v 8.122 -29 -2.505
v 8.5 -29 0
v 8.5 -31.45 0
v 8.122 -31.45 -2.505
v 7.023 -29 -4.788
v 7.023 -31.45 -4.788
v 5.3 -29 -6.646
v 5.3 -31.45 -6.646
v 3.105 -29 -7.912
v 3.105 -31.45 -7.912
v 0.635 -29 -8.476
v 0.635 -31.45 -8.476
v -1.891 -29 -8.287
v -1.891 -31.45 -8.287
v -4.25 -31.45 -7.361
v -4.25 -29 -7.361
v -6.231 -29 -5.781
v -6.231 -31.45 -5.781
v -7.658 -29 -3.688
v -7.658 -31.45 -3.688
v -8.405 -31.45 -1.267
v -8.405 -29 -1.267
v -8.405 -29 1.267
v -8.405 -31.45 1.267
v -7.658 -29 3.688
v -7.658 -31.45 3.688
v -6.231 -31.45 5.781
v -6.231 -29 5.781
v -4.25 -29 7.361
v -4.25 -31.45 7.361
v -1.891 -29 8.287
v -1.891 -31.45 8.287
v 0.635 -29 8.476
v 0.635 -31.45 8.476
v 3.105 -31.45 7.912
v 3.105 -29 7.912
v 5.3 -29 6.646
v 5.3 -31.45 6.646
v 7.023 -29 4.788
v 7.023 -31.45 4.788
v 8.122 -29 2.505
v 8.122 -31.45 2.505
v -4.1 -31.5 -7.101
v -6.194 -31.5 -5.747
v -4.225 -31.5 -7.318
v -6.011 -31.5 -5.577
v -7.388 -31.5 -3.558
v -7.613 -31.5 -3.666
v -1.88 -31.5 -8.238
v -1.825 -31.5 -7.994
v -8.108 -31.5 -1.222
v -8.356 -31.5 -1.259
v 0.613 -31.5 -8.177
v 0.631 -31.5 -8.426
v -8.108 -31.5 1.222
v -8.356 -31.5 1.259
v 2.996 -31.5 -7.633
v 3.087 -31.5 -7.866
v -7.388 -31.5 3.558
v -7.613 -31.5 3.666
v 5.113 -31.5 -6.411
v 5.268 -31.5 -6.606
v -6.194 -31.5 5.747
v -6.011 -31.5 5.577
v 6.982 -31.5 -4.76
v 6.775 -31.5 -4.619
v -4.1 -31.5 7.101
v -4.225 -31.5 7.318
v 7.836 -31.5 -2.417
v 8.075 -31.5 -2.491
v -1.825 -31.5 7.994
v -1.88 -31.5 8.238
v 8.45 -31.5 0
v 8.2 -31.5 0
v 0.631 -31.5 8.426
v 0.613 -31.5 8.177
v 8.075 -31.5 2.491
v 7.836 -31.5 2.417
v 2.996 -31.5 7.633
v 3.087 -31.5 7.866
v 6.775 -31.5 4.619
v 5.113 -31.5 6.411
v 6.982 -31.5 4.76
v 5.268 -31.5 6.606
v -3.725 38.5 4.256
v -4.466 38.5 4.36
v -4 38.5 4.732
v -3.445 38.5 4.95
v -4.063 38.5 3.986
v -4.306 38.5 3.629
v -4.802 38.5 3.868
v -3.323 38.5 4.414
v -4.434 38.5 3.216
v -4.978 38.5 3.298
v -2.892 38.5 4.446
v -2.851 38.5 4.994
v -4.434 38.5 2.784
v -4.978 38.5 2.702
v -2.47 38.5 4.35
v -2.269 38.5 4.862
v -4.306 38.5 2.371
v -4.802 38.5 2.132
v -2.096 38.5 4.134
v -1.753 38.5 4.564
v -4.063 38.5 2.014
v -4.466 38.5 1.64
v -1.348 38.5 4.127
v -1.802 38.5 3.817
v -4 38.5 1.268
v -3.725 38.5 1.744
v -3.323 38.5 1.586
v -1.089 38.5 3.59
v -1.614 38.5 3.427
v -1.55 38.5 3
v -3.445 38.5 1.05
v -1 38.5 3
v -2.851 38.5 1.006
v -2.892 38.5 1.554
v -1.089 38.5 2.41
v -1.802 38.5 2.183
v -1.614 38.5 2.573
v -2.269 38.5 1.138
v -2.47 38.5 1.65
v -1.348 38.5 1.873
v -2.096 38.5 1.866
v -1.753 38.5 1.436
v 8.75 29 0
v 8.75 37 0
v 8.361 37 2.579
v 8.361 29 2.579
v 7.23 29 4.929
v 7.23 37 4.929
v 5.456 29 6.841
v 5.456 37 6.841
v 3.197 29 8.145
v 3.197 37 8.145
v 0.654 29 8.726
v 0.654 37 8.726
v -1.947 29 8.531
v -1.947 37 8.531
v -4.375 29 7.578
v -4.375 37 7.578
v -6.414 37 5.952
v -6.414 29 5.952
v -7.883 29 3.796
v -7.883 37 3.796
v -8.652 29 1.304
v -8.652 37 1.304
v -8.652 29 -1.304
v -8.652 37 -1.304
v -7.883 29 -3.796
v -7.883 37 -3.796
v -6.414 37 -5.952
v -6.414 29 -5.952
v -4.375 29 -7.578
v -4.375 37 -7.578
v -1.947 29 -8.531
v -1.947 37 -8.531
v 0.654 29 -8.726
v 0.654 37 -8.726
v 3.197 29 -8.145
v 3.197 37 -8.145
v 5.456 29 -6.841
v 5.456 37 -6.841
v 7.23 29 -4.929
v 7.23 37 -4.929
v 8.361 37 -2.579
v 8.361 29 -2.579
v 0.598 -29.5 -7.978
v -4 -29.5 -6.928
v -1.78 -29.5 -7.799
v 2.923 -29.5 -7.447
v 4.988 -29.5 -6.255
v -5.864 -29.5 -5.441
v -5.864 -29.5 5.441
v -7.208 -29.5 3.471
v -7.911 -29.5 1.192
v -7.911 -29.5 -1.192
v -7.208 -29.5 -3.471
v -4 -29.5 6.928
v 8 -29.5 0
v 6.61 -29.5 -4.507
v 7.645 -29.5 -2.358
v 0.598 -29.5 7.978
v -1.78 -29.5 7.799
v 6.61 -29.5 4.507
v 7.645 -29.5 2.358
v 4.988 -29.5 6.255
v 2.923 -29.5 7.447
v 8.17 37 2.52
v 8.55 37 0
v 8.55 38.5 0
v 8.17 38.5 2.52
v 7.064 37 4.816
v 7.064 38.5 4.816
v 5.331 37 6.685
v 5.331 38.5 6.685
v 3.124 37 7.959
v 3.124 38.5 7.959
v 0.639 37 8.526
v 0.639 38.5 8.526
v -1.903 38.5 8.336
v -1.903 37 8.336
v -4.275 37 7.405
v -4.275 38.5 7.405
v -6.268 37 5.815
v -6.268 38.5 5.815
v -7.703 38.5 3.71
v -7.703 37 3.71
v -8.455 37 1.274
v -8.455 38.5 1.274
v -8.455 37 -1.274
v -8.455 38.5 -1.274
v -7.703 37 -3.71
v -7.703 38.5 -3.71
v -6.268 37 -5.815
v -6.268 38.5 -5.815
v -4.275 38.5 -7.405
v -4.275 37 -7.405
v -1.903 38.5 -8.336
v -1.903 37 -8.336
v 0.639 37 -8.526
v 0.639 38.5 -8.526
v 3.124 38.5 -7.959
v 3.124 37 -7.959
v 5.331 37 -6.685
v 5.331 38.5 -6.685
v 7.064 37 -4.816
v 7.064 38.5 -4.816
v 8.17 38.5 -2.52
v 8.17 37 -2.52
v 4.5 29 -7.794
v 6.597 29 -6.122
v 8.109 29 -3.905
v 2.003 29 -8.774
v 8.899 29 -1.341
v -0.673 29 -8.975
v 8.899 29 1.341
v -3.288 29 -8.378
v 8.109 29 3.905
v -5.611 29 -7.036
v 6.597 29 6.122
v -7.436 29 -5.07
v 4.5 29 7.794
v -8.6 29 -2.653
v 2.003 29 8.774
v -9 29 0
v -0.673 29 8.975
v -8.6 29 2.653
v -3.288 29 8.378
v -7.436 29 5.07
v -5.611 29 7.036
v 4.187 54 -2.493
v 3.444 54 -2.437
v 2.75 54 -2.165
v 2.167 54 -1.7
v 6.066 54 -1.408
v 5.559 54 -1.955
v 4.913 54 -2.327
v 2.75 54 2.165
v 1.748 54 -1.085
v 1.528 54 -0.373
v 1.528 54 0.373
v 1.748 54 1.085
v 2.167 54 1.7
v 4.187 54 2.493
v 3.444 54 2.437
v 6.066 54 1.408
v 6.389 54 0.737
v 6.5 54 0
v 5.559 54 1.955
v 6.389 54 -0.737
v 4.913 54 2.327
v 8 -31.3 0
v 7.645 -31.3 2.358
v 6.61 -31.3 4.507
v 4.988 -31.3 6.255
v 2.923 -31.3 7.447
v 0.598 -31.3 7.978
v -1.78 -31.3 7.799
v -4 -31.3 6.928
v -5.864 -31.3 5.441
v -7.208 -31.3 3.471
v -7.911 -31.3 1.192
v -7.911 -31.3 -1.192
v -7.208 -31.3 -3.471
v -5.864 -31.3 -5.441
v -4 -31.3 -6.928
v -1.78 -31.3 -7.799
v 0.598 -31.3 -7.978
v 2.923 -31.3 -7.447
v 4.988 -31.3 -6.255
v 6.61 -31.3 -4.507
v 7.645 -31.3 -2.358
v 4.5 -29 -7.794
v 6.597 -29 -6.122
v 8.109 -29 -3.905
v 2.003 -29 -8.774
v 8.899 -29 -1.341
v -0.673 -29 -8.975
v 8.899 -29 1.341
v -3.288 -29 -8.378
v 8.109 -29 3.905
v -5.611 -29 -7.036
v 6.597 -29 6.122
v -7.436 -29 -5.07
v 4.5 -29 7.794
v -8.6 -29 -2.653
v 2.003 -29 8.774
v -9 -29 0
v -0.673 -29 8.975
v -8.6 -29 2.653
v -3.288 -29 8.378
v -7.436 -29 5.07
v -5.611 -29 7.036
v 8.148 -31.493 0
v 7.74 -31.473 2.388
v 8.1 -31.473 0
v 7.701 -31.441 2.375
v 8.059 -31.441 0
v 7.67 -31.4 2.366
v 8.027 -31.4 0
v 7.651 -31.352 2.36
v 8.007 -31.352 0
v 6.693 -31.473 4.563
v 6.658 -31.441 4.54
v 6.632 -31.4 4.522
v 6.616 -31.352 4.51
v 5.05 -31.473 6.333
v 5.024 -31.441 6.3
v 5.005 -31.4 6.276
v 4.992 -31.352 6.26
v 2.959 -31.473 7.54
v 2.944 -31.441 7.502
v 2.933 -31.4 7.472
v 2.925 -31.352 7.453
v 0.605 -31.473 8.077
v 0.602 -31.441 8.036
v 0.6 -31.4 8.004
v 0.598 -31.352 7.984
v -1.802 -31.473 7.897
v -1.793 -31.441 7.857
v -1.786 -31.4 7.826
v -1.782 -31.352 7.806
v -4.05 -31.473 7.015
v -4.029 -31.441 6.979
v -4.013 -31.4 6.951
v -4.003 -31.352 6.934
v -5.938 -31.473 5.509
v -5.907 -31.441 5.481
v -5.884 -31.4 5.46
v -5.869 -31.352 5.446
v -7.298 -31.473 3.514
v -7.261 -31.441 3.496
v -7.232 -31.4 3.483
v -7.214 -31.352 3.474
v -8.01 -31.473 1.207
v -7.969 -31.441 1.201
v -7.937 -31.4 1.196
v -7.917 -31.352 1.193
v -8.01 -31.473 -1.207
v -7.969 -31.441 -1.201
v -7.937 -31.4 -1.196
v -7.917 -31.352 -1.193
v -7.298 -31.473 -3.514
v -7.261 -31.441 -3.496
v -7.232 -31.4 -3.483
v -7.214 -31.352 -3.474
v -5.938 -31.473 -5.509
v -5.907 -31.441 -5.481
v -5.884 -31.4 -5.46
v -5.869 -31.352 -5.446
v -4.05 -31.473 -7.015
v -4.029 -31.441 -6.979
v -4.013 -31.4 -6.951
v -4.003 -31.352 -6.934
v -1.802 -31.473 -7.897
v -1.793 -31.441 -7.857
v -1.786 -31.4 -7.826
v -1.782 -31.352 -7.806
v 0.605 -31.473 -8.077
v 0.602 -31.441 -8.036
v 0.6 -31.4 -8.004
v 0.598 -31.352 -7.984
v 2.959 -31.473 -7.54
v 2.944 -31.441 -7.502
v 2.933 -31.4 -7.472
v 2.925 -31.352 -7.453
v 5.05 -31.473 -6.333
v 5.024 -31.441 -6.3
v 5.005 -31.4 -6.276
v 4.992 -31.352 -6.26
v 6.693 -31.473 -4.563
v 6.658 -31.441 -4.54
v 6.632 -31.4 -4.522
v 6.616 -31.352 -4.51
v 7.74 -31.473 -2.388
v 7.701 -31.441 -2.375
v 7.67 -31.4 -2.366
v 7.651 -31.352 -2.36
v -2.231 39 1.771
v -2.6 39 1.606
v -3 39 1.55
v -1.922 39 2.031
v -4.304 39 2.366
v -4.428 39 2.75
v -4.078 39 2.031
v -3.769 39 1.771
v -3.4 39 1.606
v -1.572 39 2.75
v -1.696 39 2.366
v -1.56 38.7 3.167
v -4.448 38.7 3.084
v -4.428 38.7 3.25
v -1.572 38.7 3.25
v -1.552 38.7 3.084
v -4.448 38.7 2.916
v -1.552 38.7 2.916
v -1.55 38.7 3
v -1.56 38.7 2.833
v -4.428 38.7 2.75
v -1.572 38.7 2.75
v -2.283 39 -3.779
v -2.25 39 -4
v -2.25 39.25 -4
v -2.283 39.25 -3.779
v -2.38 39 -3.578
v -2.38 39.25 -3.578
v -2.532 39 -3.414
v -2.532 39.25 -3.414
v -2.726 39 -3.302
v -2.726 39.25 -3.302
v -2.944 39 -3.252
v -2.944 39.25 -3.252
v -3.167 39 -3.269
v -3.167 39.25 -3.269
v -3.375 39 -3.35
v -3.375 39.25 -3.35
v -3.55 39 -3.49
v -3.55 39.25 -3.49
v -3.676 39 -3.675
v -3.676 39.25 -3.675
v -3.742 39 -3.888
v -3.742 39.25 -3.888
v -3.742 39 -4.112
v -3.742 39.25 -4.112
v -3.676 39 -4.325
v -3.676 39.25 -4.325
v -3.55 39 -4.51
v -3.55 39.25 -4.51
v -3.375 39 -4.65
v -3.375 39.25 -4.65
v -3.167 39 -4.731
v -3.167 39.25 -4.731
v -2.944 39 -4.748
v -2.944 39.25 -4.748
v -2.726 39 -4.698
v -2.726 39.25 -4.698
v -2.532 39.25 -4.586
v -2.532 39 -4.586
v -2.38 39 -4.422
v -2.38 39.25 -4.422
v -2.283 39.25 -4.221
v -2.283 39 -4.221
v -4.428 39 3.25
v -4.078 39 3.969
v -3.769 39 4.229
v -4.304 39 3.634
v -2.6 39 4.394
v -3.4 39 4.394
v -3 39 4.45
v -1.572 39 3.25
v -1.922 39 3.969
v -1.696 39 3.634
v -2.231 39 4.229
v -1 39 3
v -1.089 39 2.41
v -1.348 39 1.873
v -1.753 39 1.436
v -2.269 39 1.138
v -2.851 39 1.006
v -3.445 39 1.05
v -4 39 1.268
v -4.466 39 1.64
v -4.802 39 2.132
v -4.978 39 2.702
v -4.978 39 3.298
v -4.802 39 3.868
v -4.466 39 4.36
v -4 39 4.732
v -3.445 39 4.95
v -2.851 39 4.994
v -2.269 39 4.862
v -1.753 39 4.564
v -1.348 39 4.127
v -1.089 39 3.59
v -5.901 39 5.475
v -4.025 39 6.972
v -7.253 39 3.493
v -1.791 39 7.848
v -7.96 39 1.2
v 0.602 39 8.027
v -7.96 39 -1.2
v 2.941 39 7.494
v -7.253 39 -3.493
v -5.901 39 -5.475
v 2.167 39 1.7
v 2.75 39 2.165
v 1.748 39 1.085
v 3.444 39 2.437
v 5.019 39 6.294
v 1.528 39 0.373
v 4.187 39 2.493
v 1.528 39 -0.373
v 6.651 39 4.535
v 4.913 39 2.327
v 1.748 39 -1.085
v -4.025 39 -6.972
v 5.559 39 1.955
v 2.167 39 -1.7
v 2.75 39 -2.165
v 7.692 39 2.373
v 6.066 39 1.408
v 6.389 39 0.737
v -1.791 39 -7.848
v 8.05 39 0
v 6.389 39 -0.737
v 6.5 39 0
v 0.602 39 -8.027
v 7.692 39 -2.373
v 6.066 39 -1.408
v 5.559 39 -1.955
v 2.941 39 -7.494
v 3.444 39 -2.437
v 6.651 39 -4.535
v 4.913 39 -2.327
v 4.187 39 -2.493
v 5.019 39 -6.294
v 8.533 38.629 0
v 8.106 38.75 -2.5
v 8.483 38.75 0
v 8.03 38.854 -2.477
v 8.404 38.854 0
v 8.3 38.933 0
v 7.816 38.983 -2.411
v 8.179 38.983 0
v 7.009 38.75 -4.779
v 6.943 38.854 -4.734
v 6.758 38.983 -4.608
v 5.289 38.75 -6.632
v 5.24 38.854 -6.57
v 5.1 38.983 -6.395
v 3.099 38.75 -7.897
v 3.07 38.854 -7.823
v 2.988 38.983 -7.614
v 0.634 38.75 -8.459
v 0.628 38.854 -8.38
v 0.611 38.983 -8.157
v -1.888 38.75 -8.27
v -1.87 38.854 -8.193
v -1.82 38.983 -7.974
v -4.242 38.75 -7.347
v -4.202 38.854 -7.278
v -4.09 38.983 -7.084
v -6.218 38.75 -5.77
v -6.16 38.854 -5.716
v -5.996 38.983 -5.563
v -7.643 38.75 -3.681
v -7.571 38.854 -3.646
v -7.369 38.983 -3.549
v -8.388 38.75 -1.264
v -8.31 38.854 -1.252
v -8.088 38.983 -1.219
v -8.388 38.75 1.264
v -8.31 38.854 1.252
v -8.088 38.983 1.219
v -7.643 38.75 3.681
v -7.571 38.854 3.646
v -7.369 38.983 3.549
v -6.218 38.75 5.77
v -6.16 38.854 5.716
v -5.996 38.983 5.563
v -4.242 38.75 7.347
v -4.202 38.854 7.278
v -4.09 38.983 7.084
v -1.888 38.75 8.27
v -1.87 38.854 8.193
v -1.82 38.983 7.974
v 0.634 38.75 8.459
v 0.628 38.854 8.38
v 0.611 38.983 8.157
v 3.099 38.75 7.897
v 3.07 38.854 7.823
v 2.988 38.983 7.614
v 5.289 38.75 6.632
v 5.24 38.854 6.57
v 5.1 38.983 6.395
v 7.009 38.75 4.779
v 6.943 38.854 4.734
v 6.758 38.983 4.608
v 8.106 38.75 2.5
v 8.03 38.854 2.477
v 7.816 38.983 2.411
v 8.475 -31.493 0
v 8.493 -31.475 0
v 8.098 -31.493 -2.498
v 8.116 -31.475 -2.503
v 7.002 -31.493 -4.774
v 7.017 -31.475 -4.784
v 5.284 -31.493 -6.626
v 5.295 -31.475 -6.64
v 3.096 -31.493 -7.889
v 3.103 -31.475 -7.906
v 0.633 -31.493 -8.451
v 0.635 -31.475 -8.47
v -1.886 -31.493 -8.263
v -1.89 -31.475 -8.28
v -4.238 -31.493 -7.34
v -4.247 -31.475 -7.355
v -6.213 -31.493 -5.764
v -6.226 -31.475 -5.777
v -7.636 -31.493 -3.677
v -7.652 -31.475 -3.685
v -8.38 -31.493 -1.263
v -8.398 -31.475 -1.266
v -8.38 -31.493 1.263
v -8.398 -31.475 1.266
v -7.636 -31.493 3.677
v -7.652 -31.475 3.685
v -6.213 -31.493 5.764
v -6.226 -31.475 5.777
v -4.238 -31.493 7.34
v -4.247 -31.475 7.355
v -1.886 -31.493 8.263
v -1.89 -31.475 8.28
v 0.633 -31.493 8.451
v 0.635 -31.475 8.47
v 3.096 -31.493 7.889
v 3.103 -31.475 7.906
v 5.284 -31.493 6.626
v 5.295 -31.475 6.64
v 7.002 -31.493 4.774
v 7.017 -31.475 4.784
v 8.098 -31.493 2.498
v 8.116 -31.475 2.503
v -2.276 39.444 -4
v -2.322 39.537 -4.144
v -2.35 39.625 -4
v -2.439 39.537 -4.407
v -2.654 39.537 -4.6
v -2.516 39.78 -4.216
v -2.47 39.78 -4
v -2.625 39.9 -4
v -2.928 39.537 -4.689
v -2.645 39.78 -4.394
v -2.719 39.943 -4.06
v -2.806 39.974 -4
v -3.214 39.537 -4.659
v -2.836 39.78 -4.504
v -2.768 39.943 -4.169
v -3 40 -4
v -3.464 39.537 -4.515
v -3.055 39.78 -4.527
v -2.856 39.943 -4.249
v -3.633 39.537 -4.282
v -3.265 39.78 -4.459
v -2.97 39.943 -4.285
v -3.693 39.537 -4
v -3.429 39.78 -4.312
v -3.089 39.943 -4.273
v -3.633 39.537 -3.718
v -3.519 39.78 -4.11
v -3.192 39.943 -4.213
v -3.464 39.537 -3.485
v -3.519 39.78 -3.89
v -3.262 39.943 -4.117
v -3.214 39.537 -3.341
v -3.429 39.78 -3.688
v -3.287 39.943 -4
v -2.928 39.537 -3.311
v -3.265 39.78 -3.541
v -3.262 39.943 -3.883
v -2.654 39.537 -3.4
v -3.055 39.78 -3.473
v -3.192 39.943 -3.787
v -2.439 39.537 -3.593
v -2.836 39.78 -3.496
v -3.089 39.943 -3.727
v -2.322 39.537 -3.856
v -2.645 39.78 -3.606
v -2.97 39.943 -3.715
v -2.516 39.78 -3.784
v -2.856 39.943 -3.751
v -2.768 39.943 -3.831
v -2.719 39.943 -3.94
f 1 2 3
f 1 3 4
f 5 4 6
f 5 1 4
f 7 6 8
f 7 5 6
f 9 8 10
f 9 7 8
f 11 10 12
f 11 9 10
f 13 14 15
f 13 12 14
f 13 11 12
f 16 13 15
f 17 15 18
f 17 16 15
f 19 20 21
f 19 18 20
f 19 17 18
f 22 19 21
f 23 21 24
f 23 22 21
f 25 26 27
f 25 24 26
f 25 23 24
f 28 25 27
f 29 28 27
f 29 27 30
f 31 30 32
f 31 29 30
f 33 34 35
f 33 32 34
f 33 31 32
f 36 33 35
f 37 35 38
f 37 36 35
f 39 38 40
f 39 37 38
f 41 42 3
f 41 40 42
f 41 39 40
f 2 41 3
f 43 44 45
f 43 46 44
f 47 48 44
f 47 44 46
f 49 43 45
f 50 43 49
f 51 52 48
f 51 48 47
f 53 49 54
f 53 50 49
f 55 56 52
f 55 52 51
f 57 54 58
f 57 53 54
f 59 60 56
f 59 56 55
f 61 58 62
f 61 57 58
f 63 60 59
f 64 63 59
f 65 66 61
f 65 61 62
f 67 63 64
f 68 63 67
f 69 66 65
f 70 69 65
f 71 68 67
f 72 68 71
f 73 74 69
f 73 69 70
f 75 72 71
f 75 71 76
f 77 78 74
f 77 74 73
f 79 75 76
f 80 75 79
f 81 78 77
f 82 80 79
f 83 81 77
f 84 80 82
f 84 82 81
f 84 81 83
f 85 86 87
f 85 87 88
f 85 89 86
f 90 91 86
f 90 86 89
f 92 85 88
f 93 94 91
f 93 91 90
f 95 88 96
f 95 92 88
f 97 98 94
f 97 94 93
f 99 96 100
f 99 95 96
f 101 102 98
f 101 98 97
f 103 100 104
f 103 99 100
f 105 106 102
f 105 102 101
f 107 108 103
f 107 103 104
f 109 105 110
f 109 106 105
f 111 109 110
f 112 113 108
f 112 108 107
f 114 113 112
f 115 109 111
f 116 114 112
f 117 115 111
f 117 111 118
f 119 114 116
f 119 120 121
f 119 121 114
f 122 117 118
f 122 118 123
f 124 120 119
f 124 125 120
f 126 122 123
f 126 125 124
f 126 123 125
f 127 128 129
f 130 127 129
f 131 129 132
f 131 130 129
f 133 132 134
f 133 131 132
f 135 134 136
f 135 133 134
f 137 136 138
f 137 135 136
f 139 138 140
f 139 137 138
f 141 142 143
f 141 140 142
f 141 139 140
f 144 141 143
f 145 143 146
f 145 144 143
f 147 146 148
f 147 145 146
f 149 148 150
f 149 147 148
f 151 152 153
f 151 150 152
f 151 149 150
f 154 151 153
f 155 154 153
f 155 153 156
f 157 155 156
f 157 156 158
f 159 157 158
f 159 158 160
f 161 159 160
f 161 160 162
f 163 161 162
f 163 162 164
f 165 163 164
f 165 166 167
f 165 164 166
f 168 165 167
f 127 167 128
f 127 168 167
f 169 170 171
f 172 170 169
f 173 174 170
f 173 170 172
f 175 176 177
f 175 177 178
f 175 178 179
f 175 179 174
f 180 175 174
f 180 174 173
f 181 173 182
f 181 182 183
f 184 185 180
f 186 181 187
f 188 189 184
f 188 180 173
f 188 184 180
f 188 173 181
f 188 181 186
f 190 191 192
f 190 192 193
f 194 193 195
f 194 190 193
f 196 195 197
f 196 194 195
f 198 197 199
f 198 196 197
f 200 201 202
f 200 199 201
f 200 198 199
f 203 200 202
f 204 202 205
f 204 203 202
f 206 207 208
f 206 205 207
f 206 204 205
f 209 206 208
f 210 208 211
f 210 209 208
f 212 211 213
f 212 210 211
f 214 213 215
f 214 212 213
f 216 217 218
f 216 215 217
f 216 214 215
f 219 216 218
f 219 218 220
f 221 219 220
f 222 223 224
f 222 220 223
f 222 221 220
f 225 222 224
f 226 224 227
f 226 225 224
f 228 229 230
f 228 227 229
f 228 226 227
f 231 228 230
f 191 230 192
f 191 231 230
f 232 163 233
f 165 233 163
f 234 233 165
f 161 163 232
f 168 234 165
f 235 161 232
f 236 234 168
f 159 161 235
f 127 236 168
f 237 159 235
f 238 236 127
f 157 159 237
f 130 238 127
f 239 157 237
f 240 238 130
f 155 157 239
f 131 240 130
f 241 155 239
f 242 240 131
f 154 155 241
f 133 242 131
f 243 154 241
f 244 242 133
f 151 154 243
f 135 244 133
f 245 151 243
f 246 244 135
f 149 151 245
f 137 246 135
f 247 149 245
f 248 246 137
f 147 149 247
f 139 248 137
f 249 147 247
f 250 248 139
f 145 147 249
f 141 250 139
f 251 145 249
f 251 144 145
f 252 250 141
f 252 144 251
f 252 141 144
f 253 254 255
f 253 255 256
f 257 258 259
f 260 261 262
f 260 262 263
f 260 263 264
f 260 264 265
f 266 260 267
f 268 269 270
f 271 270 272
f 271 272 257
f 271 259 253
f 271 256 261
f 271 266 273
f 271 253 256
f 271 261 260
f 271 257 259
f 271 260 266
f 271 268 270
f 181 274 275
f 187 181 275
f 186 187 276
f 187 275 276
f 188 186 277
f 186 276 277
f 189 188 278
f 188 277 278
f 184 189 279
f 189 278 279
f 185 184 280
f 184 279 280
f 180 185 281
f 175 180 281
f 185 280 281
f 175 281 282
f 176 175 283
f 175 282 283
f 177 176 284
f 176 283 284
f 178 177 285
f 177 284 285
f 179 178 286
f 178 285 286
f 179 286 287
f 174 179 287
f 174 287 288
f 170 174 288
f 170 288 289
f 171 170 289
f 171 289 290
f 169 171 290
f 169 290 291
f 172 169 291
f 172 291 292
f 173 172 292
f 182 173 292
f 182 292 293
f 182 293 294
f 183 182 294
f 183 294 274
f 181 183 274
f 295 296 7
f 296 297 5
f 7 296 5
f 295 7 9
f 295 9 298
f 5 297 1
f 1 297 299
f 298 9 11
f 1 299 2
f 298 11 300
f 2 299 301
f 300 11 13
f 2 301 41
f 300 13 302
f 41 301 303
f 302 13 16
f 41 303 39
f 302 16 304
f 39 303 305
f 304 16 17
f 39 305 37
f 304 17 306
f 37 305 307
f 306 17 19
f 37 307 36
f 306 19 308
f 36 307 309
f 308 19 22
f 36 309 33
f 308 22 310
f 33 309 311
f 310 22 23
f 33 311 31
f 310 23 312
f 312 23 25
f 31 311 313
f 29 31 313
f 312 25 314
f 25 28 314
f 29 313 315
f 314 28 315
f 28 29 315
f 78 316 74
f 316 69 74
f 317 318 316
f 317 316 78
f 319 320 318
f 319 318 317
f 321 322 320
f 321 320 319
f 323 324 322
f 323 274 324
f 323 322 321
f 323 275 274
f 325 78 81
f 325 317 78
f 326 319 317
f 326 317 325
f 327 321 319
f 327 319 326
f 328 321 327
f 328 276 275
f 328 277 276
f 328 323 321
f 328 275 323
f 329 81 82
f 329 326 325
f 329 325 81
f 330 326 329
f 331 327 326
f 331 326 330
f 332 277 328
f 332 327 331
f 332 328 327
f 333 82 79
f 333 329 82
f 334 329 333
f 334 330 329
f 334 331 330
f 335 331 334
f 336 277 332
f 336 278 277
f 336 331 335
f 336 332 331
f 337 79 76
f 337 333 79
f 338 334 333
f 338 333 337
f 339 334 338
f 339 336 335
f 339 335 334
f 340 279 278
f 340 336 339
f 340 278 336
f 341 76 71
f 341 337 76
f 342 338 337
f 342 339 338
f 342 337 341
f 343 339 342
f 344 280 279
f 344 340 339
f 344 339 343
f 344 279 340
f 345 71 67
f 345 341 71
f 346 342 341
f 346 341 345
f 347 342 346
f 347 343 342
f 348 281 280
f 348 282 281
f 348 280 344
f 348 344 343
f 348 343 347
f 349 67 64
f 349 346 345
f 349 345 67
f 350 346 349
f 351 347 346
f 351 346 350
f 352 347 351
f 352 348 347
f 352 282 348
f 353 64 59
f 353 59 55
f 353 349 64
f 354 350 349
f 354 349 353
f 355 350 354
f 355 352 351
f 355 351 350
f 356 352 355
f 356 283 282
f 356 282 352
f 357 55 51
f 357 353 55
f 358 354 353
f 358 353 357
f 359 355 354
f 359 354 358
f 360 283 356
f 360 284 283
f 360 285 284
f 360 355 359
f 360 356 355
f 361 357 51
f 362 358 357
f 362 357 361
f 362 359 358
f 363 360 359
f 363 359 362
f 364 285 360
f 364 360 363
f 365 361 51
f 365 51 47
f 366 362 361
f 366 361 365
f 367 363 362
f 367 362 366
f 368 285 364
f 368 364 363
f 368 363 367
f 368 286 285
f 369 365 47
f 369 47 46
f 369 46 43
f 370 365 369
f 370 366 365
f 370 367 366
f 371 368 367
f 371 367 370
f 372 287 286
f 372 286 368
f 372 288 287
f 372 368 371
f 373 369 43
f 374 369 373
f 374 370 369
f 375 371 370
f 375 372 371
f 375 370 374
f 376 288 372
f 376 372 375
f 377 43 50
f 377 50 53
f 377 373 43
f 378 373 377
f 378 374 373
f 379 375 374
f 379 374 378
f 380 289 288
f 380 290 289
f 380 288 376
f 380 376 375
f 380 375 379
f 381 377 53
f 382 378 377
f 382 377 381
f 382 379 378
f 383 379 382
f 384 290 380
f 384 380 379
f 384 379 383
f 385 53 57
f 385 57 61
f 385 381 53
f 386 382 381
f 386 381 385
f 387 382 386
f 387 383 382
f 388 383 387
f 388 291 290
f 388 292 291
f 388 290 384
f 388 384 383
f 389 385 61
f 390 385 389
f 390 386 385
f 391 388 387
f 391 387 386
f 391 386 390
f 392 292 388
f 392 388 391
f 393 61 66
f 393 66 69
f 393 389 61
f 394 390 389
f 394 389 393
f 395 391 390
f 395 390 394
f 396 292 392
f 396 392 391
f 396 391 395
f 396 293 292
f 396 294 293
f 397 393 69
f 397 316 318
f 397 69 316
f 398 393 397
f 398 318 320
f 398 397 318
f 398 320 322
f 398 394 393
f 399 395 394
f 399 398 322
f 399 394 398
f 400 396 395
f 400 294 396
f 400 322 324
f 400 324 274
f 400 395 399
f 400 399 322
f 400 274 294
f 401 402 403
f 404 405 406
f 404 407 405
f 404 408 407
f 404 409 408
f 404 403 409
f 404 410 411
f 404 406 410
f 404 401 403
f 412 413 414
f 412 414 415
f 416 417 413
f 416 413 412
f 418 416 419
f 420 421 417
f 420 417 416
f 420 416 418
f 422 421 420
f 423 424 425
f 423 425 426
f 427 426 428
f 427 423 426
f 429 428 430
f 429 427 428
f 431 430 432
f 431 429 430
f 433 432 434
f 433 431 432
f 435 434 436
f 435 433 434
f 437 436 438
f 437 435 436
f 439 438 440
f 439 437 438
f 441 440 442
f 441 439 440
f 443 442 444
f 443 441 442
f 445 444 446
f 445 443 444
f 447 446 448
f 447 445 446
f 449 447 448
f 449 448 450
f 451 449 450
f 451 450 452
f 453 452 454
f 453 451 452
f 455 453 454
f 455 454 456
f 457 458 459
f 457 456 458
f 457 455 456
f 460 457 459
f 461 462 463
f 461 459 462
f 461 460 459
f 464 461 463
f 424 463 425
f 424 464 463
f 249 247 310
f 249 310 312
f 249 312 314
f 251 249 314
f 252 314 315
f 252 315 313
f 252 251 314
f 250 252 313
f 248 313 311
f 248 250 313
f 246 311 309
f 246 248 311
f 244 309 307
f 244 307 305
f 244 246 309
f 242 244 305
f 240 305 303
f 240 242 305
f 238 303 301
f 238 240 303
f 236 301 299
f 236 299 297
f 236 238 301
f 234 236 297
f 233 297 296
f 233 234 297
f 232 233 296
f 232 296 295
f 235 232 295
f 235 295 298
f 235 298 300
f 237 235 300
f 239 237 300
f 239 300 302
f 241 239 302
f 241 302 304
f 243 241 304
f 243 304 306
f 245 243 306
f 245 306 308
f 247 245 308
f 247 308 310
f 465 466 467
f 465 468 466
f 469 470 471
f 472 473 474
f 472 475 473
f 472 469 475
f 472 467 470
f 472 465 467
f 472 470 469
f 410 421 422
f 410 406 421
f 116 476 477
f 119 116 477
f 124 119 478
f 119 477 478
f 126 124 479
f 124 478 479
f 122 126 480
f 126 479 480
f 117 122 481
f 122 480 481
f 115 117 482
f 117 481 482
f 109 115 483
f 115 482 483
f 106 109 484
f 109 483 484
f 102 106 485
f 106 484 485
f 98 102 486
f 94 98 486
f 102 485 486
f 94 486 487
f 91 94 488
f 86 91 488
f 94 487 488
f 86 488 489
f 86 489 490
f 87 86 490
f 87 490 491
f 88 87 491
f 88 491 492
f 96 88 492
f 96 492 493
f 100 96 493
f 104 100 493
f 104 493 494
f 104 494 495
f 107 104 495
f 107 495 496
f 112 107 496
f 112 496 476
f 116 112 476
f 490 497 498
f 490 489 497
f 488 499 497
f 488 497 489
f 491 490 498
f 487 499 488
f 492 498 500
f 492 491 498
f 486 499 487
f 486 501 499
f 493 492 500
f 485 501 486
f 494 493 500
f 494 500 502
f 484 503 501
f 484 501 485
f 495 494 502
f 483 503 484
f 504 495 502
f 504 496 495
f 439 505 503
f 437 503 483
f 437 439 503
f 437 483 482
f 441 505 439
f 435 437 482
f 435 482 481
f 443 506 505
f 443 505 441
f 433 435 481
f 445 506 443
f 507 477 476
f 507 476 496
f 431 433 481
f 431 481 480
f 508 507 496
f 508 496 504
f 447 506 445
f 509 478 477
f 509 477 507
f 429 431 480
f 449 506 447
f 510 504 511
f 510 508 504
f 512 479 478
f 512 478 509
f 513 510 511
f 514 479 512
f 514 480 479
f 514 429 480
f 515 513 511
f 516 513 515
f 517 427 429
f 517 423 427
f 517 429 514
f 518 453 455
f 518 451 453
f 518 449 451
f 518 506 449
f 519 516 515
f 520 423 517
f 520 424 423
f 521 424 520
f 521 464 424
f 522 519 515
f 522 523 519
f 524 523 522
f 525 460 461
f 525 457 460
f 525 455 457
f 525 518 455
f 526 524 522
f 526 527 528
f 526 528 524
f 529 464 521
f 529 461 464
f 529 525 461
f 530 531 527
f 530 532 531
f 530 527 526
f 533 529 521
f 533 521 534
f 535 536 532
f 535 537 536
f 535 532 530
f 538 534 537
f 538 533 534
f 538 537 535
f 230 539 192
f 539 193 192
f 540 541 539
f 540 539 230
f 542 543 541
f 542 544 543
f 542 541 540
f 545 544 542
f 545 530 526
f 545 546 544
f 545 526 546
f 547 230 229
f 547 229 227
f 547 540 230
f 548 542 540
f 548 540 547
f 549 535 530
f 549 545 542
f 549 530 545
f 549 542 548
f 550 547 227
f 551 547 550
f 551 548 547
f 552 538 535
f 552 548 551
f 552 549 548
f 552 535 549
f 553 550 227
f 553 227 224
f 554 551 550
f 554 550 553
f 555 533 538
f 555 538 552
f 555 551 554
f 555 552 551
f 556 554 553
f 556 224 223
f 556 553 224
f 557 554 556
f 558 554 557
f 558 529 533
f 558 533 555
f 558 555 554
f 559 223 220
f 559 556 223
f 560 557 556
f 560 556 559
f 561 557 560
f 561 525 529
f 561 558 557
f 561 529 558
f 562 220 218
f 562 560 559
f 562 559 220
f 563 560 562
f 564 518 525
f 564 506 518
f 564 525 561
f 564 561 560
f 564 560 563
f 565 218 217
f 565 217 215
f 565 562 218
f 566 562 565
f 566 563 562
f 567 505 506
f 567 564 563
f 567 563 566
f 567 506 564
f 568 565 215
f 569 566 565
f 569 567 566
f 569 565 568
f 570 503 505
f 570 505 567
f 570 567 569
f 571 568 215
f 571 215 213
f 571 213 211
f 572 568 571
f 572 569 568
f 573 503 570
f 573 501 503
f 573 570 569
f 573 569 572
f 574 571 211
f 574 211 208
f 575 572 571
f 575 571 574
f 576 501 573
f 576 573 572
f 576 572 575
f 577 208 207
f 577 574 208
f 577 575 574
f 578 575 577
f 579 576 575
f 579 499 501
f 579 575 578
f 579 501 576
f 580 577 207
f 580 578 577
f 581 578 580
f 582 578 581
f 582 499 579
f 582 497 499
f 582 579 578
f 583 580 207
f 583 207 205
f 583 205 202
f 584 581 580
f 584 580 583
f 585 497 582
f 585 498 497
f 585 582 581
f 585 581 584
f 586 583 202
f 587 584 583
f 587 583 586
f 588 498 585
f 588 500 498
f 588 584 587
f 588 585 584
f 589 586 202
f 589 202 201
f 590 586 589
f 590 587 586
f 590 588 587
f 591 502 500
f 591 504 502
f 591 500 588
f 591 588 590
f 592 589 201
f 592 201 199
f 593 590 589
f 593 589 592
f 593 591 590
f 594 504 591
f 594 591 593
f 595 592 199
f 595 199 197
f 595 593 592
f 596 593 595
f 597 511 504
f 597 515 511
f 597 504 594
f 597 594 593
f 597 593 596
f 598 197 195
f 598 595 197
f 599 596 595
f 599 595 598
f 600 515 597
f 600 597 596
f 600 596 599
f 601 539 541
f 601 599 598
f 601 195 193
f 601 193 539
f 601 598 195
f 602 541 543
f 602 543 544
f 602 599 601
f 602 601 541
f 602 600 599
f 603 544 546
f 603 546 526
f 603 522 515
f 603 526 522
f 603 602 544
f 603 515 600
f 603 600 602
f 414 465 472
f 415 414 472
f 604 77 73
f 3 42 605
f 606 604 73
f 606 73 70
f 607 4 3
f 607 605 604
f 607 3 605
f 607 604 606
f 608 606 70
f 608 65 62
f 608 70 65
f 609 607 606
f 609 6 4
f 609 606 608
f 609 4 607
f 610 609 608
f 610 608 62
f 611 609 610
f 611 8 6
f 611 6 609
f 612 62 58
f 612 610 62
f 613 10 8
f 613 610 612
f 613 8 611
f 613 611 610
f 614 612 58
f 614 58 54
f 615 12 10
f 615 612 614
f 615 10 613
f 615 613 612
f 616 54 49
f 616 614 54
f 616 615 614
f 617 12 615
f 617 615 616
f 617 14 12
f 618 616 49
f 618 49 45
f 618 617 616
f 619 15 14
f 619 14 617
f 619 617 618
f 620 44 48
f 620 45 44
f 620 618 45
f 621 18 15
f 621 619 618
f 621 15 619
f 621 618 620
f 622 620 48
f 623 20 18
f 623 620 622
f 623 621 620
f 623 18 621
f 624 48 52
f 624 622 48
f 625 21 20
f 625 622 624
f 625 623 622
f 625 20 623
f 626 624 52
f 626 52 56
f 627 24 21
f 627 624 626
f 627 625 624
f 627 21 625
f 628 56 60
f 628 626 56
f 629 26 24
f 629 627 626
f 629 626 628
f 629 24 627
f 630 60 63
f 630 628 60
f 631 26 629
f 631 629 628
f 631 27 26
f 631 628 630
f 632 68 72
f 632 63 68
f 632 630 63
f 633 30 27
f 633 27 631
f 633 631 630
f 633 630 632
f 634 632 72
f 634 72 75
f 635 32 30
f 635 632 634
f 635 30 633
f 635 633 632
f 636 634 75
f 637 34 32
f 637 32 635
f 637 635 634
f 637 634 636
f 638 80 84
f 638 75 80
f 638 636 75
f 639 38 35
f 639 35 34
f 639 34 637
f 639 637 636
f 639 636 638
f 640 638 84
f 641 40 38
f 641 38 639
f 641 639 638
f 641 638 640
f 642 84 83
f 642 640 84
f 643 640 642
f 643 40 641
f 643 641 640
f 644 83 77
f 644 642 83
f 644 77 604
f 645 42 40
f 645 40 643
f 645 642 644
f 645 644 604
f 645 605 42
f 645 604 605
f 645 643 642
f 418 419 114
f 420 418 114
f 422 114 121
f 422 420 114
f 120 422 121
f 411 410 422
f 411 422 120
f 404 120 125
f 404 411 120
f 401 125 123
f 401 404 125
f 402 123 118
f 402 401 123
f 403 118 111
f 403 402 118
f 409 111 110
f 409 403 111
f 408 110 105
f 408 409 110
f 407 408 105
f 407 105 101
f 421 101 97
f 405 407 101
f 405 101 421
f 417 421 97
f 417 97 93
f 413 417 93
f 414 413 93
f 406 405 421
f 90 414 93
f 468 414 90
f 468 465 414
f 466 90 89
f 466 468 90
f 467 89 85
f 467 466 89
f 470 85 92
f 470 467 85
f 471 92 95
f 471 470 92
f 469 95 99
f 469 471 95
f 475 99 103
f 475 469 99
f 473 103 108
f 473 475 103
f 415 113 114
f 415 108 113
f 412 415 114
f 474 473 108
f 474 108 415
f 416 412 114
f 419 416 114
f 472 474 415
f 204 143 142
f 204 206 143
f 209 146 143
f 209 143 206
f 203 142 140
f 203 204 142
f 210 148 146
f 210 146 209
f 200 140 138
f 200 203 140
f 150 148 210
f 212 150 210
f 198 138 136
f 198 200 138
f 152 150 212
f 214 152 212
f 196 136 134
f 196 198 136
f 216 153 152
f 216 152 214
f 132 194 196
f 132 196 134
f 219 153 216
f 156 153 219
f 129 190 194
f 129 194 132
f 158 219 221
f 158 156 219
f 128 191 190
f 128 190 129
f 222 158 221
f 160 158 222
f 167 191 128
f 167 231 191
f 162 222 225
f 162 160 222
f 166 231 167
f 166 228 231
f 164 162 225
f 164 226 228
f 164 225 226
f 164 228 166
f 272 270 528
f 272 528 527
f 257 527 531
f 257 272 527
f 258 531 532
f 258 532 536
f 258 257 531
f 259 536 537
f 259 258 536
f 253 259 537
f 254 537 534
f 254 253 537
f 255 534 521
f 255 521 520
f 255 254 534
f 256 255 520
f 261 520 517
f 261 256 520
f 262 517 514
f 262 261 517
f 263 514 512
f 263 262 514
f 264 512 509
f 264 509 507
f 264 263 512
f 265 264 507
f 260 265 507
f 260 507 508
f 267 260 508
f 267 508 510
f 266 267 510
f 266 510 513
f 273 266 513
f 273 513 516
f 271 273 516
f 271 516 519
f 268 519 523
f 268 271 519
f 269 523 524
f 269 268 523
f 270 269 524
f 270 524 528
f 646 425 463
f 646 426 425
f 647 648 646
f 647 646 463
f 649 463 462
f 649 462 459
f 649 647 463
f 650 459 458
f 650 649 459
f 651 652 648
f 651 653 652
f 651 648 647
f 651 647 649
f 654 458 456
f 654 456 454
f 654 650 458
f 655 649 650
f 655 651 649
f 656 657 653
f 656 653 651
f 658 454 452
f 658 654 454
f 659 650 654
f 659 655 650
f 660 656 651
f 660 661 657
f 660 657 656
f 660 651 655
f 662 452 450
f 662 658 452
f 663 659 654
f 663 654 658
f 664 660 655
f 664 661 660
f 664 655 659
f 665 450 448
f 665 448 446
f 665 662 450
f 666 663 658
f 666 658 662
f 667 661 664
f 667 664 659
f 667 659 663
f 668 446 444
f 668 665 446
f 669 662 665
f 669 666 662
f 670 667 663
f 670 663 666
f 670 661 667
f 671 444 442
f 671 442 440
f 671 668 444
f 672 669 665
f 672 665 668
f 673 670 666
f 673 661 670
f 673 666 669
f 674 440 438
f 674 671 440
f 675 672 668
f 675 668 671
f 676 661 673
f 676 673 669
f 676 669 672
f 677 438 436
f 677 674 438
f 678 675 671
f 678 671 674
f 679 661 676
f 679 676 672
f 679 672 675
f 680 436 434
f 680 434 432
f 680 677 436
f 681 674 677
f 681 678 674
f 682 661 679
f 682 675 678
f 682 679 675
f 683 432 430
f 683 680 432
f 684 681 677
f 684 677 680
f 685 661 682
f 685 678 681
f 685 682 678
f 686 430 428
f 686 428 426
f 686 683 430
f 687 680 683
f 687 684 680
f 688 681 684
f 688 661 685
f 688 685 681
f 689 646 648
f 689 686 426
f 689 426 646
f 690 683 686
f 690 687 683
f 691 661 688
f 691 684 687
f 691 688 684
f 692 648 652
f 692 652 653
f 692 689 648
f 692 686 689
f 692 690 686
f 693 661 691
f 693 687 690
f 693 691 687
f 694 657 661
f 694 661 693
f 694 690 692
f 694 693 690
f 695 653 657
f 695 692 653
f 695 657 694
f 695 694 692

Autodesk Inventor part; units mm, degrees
ref_plane "YZ Plane" through (0, 0, 0) normal (1, 0, 0) x (0, 1, 0)
ref_plane "XZ Plane" through (0, 0, 0) normal (0, 1, 0) x (-1, 0, 0)
ref_plane "XY Plane" through (0, 0, 0) normal (0, 0, 1) x (1, 0, 0)
sketch "Sketch1" plane through (0, 0, 0) normal (0, 1, 0) x (-1, 0, 0)
  circle A0 centre (0, 0) radius 9
  dimension "d0" = 18
extrude "Extrusion1" add sketch "Sketch1" along normal mid plane 58
thread "Thread1"
sketch "Sketch2" plane through (0, -29, 0) normal (0, -1, 0) x (1, 0, 0)
  circle A0 centre (0, 0) radius 8.5
  dimension "d13" = 17
extrude "Extrusion2" add sketch "Sketch2" along normal blind 2.5
sketch "Sketch3" plane through (0, -31.5, 0) normal (0, -1, 0) x (1, 0, 0)
  circle A0 centre (0, 0) radius 8
  circle A1 centre (0, 0) radius 8.5 projected
  dimension "d14" = 0.5
extrude "Extrusion3" cut sketch "Sketch3" against normal blind 2 contours A0
fillet "Fillet1" radius 0.2 1 edges at (-8, -31.5, 0)
fillet "Fillet2" radius 0.05 1 edges at (-8.5, -31.5, 0)
sketch "Sketch4" plane through (0, 29, 0) normal (0, 1, 0) x (1, 0, 0)
  circle A0 centre (0, 0) radius 8.75
  dimension "d15" = 17.5
extrude "Extrusion4" add sketch "Sketch4" along normal blind 8
sketch "Sketch5" plane through (0, 37, 0) normal (0, 1, 0) x (1, 0, 0)
  circle A0 centre (0, 0) radius 8.55
  circle A1 centre (0, 0) radius 8.75 projected
  dimension "d18" = 0.2
extrude "Extrusion5" add sketch "Sketch5" along normal blind 2 contours A0
fillet "Fillet3" radius 0.5 1 edges at (-8.55, 39, 0)
sketch "Sketch6" plane through (0, 39, 0) normal (0, 1, 0) x (1, 0, 0)
  circle A0 centre (4, 0) radius 2.5
  point P0 (0, 0)
  dimension "d22" = 5
  dimension "d23" = 4
sketch3d "3D Sketch1"
  line L0 (4, 39, 0) -> (4, 54, 0)
  dimension "d26" = 15
sweep "Sweep2" add profiles "Sketch6" path "3D Sketch1"
sketch "Sketch7" plane through (0, 39, 0) normal (0, 1, 0) x (1, 0, 0)
  circle A0 centre (-3, -3) radius 2
  circle A1 centre (-3, -3) radius 1.45
  line L0 (-4.4283, -3.25) -> (-1.5717, -3.25)
  line L1 (-4.4283, -2.75) -> (-1.5717, -2.75)
  point P0 (0, 0)
  dimension "d29" = 4
  dimension "d30" = 3
  dimension "d31" = 3
  dimension "d32" = 2.9
  dimension "d33" = 0.5
  dimension "d34" = 0.25
extrude "Extrusion6" cut sketch "Sketch7" against normal blind 0.5
extrude "Extrusion7" cut sketch "Sketch7" against normal blind 0.3 contours A1 L0 L1
sketch "Sketch8" plane through (0, 39, 0) normal (0, 1, 0) x (1, 0, 0)
  circle A0 centre (-3, 4) radius 0.75
  point P0 (0, 0)
  dimension "d39" = 1.5
  dimension "d40" = 4
  dimension "d41" = 3
extrude "Extrusion8" add sketch "Sketch8" along normal blind 1
fillet "Fillet4" radius 0.75 1 edges at (-3.75, 40, -4)
sketch "Sketch9" plane through (0, -29.5, 0) normal (0, -1, 0) x (1, 0, 0)
  line L0 (1.5, 5) -> (-1.5, 5)
  line L1 (-1.5, 5) -> (-1.5, 1)
  line L2 (-1.5, 1) -> (1.5, 1)
  line L3 (1.5, 1) -> (1.5, 5)
  line L4 (1.5, -1) -> (-1.5, -1)
  line L5 (-1.5, -1) -> (-1.5, -5)
  line L6 (-1.5, -5) -> (1.5, -5)
  line L7 (1.5, -5) -> (1.5, -1)
  point P0 (0, 0)
  point P1 (0, 1)
  dimension "d45" = 4
  dimension "d46" = 4
  dimension "d47" = 3
  dimension "d48" = 2
  dimension "d49" = 1
sketch "Sketch10" plane through (0, 0, 0) normal (1, 0, 0) x (0, 1, 0)
  line L0 (-29.5, -5) -> (-29.5, -1) projected
  line L1 (-29.5, 1) -> (-29.5, 5) projected
  spline S0 degree 2 poles (-29.5, -1) (-31.582, -1.7446) (-29.5, -5) knots 0 0 0 1 1 1
  spline S1 degree 2 poles (-29.5, 1) (-31.5, 3) (-29.5, 5) knots 0 0 0 1 1 1
  line L2 (-29.5, -8) -> (-29.5, 8) projected
  point P0 (0, 0)
  point P1 (-30.5, -2)
  point P2 (-30.5, 3)
  dimension "d50" = 5
  dimension "d51" = 1
  dimension "d52" = 6
properties part number "2309HCMUTE-CDT23-CB_E3F-DS30C4" material "PVC-Piping"
